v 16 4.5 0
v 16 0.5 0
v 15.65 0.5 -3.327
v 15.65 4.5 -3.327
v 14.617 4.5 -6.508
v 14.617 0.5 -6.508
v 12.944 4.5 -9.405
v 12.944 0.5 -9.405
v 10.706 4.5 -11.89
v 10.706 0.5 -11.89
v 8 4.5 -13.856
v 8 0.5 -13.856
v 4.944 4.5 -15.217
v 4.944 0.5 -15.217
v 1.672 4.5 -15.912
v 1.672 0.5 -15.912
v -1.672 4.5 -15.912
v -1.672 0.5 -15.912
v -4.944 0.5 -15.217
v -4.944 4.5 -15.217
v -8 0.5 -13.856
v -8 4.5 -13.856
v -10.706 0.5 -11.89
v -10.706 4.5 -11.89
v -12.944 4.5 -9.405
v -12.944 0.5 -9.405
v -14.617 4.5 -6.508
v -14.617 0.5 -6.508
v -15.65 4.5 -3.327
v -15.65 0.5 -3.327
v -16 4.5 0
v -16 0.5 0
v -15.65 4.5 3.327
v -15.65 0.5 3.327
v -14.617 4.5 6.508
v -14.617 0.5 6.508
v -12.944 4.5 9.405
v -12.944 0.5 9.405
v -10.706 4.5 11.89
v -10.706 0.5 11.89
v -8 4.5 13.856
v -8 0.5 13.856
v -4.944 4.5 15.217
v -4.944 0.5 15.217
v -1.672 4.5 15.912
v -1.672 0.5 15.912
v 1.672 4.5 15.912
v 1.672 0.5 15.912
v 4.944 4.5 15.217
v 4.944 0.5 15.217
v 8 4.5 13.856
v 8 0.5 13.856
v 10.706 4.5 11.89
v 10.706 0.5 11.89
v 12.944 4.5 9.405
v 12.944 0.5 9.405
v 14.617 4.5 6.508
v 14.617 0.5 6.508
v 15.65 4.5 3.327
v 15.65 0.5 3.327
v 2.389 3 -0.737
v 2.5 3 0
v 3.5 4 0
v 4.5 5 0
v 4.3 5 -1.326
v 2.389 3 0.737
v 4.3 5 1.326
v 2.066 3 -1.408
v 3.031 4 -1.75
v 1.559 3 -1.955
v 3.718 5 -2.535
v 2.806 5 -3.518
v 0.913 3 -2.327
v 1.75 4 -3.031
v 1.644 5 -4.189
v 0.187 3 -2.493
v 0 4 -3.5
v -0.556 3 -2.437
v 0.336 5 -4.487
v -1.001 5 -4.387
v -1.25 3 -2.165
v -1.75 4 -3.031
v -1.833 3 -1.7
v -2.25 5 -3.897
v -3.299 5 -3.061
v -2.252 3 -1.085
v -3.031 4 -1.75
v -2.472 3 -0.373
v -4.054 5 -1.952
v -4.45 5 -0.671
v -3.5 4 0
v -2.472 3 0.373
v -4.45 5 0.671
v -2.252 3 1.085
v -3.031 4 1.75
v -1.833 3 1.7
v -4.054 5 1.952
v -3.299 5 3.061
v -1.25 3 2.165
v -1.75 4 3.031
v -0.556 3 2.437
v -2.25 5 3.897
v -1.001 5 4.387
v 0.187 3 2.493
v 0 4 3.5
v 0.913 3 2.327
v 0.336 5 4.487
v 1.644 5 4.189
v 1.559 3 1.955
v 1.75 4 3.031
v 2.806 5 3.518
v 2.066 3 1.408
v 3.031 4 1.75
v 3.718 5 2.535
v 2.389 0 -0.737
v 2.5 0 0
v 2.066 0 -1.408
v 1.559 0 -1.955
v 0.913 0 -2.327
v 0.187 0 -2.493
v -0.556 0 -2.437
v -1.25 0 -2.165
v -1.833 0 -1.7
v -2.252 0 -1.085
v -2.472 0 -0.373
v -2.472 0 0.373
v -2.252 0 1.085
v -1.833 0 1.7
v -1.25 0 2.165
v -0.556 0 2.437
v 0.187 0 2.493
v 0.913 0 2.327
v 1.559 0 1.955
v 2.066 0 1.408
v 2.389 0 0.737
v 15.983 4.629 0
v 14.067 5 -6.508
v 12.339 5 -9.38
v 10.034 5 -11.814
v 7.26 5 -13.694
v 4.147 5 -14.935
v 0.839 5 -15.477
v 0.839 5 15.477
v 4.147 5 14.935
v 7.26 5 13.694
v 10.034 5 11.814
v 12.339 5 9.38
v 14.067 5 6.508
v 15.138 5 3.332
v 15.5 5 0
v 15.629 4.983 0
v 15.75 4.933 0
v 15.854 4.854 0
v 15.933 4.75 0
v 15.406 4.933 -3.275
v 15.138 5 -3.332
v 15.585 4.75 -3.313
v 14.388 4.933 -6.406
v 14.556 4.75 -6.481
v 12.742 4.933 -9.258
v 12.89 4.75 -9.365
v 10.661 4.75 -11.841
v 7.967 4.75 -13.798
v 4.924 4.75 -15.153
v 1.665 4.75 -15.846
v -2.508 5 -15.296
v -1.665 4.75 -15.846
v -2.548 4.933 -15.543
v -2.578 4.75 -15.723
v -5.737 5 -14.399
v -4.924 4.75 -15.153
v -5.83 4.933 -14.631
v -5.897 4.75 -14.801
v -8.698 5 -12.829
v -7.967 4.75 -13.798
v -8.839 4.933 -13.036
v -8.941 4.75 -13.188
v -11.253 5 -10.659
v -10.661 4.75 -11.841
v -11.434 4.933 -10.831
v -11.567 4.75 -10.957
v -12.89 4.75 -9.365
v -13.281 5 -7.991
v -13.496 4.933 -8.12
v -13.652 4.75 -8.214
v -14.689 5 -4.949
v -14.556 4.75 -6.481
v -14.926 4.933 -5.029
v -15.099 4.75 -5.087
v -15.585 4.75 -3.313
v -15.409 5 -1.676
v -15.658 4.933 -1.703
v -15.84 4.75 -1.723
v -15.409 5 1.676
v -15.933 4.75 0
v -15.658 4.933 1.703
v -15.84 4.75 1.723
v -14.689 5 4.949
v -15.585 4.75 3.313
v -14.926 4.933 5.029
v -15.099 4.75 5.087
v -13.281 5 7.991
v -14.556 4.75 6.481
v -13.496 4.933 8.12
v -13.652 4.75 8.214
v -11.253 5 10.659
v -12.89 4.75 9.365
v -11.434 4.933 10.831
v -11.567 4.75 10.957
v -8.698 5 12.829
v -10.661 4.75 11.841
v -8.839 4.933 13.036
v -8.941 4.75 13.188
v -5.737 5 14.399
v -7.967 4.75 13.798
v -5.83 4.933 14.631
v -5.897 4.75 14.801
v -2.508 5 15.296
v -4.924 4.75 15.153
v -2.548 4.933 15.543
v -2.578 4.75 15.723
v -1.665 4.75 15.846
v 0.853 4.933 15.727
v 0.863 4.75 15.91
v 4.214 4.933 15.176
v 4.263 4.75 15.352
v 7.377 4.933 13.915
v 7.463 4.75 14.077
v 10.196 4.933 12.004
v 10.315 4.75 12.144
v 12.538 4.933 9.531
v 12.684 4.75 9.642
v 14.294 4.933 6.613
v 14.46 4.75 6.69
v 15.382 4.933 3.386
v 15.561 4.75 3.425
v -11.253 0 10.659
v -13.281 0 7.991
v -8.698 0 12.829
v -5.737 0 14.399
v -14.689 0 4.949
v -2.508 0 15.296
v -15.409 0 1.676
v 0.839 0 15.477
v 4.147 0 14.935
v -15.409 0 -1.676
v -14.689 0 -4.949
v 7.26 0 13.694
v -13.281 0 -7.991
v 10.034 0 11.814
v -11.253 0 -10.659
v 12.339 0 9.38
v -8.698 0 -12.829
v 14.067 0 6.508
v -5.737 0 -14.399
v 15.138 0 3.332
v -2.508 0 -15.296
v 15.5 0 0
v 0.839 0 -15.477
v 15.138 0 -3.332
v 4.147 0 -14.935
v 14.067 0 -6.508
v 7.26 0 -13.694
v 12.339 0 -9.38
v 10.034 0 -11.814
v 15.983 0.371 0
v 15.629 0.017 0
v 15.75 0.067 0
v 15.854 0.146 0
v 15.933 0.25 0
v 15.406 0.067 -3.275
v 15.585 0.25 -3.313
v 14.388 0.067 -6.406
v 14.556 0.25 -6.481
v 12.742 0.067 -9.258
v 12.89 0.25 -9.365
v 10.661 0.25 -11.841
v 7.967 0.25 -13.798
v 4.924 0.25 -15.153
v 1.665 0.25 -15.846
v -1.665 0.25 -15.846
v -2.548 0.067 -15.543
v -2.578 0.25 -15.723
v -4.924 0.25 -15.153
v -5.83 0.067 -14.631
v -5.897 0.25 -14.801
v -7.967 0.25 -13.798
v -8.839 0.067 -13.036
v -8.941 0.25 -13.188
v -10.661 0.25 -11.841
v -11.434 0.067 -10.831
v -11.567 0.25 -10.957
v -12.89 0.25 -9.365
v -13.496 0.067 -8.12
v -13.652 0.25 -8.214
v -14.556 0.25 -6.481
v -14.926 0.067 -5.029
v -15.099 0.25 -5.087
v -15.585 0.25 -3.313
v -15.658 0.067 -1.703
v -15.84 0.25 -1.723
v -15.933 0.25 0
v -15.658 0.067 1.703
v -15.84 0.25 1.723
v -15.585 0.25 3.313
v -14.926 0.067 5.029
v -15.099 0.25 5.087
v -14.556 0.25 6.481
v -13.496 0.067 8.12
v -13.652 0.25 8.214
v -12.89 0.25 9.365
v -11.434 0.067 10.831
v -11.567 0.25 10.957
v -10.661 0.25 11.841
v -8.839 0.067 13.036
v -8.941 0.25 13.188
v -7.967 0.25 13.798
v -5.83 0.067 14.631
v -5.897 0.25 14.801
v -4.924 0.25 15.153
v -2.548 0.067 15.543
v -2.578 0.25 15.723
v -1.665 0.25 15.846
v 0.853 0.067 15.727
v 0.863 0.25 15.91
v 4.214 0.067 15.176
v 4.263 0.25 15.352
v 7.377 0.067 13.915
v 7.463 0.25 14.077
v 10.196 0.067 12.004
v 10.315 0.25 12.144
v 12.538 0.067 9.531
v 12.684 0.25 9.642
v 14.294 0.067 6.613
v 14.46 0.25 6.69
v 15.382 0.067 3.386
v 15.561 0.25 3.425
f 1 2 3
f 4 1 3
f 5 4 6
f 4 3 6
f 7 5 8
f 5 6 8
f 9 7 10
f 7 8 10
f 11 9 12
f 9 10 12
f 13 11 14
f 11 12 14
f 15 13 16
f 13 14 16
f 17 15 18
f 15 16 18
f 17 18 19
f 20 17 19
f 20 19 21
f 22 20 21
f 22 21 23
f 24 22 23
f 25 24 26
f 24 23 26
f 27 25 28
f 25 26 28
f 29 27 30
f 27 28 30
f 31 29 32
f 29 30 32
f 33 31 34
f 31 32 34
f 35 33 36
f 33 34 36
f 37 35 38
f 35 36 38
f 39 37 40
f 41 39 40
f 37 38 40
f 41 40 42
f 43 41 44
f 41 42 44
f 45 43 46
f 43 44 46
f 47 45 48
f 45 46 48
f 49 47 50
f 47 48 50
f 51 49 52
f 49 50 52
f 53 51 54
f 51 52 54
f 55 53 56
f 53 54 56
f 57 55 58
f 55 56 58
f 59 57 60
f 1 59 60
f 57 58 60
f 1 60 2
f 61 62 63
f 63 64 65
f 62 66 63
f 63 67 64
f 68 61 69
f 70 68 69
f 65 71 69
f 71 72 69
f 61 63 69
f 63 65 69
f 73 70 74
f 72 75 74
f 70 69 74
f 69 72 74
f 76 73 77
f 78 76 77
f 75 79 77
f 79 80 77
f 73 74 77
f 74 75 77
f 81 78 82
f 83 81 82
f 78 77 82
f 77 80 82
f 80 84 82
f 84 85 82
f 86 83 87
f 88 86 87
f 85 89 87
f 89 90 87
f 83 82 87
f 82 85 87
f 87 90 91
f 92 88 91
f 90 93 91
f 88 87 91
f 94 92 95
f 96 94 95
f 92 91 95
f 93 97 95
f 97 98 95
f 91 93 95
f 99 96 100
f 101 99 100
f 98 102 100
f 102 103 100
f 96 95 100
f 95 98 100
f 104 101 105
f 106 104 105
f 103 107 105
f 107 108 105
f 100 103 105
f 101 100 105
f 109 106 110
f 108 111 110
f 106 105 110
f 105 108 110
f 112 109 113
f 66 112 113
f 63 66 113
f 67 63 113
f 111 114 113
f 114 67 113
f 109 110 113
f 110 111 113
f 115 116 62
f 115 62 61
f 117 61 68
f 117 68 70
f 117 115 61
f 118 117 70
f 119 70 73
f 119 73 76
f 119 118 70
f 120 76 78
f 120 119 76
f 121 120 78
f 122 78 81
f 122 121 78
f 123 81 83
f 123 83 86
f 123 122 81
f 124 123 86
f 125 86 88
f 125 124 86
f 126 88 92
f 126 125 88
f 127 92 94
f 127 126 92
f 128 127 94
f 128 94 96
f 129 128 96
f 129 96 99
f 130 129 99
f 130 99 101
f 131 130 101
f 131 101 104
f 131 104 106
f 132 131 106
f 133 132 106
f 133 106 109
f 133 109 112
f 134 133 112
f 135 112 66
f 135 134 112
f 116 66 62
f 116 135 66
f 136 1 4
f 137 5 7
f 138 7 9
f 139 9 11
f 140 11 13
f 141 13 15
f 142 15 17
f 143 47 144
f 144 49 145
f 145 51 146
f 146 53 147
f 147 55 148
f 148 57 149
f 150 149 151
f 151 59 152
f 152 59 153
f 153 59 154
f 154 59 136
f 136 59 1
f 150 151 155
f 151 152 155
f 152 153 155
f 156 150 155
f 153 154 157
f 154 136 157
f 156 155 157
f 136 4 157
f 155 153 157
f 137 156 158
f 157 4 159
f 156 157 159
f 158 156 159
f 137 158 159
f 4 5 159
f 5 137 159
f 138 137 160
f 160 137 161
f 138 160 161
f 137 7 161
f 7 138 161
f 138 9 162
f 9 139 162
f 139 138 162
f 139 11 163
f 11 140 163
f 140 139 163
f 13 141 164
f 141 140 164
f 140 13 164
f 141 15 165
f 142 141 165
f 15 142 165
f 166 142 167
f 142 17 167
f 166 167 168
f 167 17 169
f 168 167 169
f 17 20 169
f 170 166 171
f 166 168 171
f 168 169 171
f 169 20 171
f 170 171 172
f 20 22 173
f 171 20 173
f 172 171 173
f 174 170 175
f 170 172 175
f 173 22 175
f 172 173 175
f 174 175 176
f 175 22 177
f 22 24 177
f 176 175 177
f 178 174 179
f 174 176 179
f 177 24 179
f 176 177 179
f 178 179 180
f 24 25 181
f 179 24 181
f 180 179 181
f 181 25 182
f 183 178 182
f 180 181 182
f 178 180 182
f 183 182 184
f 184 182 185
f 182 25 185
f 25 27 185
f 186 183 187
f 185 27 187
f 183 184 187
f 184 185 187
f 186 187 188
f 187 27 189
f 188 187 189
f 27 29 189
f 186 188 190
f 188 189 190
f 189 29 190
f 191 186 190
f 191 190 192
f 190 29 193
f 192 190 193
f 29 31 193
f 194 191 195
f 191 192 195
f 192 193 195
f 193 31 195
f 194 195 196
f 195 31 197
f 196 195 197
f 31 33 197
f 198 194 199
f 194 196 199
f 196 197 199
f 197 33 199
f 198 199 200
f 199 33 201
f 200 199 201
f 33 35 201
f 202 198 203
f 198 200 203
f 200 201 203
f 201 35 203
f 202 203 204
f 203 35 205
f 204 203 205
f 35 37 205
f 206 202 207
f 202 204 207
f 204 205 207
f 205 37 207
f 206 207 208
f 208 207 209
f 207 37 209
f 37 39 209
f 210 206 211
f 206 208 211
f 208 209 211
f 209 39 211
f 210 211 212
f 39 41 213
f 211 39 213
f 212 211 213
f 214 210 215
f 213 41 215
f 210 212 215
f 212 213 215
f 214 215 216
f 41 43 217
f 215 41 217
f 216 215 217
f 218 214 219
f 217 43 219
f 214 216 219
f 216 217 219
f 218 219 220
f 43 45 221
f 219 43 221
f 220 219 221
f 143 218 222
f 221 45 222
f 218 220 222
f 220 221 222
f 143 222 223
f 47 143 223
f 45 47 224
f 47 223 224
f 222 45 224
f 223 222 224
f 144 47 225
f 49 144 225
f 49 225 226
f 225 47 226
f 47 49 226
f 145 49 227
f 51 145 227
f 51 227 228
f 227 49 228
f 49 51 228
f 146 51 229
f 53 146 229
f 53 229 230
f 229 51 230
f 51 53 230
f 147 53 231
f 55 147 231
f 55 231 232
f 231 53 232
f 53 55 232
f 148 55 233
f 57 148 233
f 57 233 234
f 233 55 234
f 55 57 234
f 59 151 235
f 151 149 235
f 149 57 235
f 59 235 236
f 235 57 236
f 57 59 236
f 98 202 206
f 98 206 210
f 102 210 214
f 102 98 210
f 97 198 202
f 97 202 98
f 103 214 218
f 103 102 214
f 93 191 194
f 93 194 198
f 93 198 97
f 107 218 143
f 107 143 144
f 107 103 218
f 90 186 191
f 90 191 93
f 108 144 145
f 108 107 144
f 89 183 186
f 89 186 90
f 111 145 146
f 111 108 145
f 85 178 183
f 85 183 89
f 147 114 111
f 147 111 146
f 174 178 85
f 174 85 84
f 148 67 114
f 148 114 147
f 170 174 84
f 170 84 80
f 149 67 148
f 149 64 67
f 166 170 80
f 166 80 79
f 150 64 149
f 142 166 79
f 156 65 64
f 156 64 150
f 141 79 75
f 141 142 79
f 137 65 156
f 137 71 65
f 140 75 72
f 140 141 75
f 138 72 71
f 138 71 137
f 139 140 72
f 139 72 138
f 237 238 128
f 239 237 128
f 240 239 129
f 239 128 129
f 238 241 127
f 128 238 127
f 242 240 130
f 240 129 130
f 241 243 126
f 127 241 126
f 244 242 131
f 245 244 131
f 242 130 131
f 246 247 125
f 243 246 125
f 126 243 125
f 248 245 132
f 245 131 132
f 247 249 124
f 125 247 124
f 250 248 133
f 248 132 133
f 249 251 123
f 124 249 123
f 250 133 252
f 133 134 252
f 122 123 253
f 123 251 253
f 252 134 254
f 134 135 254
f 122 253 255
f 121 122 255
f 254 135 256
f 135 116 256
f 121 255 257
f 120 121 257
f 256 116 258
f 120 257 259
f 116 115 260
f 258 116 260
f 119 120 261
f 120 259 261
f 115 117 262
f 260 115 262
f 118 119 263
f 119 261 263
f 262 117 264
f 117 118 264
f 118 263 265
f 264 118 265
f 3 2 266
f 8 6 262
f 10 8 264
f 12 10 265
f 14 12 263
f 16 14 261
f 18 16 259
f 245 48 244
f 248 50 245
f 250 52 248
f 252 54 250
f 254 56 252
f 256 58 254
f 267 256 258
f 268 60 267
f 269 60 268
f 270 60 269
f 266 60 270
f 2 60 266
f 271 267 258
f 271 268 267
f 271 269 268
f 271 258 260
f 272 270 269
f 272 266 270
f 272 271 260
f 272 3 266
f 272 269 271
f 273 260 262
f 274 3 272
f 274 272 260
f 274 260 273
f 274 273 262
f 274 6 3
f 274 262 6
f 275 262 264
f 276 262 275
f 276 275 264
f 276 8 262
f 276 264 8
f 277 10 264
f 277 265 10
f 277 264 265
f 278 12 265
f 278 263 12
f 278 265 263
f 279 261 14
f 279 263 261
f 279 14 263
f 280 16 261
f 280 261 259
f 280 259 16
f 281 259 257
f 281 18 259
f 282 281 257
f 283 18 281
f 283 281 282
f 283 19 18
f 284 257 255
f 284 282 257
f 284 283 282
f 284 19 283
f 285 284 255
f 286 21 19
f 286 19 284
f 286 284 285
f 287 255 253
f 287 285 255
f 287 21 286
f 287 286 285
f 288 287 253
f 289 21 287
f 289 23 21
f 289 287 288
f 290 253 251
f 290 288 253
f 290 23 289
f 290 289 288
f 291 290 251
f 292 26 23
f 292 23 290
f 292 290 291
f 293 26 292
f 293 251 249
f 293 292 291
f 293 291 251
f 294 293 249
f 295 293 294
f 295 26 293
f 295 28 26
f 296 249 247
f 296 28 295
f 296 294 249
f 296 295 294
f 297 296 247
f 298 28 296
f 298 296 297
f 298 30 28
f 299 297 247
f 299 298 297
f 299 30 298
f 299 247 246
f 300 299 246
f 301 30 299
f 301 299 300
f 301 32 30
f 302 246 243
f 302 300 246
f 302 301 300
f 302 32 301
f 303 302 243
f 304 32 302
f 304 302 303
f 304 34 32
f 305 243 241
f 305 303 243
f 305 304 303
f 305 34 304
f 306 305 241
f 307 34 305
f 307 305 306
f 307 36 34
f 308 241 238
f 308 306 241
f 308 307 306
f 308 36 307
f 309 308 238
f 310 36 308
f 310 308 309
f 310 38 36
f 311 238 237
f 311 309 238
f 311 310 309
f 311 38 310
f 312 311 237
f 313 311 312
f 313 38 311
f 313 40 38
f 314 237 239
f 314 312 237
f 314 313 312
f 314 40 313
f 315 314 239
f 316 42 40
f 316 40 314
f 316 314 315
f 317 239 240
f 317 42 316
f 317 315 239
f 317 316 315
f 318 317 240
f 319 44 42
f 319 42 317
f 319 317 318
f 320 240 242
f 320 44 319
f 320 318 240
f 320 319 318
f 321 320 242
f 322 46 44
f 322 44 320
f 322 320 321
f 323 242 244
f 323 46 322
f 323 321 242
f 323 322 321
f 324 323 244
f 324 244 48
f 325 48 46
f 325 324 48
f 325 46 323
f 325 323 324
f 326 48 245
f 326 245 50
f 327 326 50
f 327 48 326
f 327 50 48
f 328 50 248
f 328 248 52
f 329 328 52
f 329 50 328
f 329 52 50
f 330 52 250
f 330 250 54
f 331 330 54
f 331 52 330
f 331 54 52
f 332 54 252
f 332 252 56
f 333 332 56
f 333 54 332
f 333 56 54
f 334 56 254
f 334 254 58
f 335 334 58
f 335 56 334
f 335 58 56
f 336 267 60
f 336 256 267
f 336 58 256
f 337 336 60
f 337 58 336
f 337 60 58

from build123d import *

# Parameters (mm, degrees)
SKETCH1_R           = 16
SKETCH1_R_2         = 2.5
BOSS_EXTRUDE1_DEPTH = 5
CHAMFER1_SIZE       = 2
FILLET1_R           = 0.5


with BuildPart() as part:
    # Sketch1 → Boss-Extrude1 (new body)
    with BuildSketch(Plane(origin=(0, 0, 0), x_dir=(1, 0, 0), z_dir=(0, 1, 0))):
        Circle(SKETCH1_R)
        Circle(SKETCH1_R_2, mode=Mode.SUBTRACT)
    extrude(amount=BOSS_EXTRUDE1_DEPTH)

    # Chamfer1
    chamfer1_edges = [part.edges().sort_by_distance(p)[0] for p in [
        (-2.5, 5, 0),
    ]]
    chamfer(chamfer1_edges, length=CHAMFER1_SIZE)

    # Fillet1
    fillet1_edges = [part.edges().sort_by_distance(p)[0] for p in [
        (-16, 0, 0),
        (-16, 5, 0),
    ]]
    fillet(fillet1_edges, radius=FILLET1_R)


solid = part.part
